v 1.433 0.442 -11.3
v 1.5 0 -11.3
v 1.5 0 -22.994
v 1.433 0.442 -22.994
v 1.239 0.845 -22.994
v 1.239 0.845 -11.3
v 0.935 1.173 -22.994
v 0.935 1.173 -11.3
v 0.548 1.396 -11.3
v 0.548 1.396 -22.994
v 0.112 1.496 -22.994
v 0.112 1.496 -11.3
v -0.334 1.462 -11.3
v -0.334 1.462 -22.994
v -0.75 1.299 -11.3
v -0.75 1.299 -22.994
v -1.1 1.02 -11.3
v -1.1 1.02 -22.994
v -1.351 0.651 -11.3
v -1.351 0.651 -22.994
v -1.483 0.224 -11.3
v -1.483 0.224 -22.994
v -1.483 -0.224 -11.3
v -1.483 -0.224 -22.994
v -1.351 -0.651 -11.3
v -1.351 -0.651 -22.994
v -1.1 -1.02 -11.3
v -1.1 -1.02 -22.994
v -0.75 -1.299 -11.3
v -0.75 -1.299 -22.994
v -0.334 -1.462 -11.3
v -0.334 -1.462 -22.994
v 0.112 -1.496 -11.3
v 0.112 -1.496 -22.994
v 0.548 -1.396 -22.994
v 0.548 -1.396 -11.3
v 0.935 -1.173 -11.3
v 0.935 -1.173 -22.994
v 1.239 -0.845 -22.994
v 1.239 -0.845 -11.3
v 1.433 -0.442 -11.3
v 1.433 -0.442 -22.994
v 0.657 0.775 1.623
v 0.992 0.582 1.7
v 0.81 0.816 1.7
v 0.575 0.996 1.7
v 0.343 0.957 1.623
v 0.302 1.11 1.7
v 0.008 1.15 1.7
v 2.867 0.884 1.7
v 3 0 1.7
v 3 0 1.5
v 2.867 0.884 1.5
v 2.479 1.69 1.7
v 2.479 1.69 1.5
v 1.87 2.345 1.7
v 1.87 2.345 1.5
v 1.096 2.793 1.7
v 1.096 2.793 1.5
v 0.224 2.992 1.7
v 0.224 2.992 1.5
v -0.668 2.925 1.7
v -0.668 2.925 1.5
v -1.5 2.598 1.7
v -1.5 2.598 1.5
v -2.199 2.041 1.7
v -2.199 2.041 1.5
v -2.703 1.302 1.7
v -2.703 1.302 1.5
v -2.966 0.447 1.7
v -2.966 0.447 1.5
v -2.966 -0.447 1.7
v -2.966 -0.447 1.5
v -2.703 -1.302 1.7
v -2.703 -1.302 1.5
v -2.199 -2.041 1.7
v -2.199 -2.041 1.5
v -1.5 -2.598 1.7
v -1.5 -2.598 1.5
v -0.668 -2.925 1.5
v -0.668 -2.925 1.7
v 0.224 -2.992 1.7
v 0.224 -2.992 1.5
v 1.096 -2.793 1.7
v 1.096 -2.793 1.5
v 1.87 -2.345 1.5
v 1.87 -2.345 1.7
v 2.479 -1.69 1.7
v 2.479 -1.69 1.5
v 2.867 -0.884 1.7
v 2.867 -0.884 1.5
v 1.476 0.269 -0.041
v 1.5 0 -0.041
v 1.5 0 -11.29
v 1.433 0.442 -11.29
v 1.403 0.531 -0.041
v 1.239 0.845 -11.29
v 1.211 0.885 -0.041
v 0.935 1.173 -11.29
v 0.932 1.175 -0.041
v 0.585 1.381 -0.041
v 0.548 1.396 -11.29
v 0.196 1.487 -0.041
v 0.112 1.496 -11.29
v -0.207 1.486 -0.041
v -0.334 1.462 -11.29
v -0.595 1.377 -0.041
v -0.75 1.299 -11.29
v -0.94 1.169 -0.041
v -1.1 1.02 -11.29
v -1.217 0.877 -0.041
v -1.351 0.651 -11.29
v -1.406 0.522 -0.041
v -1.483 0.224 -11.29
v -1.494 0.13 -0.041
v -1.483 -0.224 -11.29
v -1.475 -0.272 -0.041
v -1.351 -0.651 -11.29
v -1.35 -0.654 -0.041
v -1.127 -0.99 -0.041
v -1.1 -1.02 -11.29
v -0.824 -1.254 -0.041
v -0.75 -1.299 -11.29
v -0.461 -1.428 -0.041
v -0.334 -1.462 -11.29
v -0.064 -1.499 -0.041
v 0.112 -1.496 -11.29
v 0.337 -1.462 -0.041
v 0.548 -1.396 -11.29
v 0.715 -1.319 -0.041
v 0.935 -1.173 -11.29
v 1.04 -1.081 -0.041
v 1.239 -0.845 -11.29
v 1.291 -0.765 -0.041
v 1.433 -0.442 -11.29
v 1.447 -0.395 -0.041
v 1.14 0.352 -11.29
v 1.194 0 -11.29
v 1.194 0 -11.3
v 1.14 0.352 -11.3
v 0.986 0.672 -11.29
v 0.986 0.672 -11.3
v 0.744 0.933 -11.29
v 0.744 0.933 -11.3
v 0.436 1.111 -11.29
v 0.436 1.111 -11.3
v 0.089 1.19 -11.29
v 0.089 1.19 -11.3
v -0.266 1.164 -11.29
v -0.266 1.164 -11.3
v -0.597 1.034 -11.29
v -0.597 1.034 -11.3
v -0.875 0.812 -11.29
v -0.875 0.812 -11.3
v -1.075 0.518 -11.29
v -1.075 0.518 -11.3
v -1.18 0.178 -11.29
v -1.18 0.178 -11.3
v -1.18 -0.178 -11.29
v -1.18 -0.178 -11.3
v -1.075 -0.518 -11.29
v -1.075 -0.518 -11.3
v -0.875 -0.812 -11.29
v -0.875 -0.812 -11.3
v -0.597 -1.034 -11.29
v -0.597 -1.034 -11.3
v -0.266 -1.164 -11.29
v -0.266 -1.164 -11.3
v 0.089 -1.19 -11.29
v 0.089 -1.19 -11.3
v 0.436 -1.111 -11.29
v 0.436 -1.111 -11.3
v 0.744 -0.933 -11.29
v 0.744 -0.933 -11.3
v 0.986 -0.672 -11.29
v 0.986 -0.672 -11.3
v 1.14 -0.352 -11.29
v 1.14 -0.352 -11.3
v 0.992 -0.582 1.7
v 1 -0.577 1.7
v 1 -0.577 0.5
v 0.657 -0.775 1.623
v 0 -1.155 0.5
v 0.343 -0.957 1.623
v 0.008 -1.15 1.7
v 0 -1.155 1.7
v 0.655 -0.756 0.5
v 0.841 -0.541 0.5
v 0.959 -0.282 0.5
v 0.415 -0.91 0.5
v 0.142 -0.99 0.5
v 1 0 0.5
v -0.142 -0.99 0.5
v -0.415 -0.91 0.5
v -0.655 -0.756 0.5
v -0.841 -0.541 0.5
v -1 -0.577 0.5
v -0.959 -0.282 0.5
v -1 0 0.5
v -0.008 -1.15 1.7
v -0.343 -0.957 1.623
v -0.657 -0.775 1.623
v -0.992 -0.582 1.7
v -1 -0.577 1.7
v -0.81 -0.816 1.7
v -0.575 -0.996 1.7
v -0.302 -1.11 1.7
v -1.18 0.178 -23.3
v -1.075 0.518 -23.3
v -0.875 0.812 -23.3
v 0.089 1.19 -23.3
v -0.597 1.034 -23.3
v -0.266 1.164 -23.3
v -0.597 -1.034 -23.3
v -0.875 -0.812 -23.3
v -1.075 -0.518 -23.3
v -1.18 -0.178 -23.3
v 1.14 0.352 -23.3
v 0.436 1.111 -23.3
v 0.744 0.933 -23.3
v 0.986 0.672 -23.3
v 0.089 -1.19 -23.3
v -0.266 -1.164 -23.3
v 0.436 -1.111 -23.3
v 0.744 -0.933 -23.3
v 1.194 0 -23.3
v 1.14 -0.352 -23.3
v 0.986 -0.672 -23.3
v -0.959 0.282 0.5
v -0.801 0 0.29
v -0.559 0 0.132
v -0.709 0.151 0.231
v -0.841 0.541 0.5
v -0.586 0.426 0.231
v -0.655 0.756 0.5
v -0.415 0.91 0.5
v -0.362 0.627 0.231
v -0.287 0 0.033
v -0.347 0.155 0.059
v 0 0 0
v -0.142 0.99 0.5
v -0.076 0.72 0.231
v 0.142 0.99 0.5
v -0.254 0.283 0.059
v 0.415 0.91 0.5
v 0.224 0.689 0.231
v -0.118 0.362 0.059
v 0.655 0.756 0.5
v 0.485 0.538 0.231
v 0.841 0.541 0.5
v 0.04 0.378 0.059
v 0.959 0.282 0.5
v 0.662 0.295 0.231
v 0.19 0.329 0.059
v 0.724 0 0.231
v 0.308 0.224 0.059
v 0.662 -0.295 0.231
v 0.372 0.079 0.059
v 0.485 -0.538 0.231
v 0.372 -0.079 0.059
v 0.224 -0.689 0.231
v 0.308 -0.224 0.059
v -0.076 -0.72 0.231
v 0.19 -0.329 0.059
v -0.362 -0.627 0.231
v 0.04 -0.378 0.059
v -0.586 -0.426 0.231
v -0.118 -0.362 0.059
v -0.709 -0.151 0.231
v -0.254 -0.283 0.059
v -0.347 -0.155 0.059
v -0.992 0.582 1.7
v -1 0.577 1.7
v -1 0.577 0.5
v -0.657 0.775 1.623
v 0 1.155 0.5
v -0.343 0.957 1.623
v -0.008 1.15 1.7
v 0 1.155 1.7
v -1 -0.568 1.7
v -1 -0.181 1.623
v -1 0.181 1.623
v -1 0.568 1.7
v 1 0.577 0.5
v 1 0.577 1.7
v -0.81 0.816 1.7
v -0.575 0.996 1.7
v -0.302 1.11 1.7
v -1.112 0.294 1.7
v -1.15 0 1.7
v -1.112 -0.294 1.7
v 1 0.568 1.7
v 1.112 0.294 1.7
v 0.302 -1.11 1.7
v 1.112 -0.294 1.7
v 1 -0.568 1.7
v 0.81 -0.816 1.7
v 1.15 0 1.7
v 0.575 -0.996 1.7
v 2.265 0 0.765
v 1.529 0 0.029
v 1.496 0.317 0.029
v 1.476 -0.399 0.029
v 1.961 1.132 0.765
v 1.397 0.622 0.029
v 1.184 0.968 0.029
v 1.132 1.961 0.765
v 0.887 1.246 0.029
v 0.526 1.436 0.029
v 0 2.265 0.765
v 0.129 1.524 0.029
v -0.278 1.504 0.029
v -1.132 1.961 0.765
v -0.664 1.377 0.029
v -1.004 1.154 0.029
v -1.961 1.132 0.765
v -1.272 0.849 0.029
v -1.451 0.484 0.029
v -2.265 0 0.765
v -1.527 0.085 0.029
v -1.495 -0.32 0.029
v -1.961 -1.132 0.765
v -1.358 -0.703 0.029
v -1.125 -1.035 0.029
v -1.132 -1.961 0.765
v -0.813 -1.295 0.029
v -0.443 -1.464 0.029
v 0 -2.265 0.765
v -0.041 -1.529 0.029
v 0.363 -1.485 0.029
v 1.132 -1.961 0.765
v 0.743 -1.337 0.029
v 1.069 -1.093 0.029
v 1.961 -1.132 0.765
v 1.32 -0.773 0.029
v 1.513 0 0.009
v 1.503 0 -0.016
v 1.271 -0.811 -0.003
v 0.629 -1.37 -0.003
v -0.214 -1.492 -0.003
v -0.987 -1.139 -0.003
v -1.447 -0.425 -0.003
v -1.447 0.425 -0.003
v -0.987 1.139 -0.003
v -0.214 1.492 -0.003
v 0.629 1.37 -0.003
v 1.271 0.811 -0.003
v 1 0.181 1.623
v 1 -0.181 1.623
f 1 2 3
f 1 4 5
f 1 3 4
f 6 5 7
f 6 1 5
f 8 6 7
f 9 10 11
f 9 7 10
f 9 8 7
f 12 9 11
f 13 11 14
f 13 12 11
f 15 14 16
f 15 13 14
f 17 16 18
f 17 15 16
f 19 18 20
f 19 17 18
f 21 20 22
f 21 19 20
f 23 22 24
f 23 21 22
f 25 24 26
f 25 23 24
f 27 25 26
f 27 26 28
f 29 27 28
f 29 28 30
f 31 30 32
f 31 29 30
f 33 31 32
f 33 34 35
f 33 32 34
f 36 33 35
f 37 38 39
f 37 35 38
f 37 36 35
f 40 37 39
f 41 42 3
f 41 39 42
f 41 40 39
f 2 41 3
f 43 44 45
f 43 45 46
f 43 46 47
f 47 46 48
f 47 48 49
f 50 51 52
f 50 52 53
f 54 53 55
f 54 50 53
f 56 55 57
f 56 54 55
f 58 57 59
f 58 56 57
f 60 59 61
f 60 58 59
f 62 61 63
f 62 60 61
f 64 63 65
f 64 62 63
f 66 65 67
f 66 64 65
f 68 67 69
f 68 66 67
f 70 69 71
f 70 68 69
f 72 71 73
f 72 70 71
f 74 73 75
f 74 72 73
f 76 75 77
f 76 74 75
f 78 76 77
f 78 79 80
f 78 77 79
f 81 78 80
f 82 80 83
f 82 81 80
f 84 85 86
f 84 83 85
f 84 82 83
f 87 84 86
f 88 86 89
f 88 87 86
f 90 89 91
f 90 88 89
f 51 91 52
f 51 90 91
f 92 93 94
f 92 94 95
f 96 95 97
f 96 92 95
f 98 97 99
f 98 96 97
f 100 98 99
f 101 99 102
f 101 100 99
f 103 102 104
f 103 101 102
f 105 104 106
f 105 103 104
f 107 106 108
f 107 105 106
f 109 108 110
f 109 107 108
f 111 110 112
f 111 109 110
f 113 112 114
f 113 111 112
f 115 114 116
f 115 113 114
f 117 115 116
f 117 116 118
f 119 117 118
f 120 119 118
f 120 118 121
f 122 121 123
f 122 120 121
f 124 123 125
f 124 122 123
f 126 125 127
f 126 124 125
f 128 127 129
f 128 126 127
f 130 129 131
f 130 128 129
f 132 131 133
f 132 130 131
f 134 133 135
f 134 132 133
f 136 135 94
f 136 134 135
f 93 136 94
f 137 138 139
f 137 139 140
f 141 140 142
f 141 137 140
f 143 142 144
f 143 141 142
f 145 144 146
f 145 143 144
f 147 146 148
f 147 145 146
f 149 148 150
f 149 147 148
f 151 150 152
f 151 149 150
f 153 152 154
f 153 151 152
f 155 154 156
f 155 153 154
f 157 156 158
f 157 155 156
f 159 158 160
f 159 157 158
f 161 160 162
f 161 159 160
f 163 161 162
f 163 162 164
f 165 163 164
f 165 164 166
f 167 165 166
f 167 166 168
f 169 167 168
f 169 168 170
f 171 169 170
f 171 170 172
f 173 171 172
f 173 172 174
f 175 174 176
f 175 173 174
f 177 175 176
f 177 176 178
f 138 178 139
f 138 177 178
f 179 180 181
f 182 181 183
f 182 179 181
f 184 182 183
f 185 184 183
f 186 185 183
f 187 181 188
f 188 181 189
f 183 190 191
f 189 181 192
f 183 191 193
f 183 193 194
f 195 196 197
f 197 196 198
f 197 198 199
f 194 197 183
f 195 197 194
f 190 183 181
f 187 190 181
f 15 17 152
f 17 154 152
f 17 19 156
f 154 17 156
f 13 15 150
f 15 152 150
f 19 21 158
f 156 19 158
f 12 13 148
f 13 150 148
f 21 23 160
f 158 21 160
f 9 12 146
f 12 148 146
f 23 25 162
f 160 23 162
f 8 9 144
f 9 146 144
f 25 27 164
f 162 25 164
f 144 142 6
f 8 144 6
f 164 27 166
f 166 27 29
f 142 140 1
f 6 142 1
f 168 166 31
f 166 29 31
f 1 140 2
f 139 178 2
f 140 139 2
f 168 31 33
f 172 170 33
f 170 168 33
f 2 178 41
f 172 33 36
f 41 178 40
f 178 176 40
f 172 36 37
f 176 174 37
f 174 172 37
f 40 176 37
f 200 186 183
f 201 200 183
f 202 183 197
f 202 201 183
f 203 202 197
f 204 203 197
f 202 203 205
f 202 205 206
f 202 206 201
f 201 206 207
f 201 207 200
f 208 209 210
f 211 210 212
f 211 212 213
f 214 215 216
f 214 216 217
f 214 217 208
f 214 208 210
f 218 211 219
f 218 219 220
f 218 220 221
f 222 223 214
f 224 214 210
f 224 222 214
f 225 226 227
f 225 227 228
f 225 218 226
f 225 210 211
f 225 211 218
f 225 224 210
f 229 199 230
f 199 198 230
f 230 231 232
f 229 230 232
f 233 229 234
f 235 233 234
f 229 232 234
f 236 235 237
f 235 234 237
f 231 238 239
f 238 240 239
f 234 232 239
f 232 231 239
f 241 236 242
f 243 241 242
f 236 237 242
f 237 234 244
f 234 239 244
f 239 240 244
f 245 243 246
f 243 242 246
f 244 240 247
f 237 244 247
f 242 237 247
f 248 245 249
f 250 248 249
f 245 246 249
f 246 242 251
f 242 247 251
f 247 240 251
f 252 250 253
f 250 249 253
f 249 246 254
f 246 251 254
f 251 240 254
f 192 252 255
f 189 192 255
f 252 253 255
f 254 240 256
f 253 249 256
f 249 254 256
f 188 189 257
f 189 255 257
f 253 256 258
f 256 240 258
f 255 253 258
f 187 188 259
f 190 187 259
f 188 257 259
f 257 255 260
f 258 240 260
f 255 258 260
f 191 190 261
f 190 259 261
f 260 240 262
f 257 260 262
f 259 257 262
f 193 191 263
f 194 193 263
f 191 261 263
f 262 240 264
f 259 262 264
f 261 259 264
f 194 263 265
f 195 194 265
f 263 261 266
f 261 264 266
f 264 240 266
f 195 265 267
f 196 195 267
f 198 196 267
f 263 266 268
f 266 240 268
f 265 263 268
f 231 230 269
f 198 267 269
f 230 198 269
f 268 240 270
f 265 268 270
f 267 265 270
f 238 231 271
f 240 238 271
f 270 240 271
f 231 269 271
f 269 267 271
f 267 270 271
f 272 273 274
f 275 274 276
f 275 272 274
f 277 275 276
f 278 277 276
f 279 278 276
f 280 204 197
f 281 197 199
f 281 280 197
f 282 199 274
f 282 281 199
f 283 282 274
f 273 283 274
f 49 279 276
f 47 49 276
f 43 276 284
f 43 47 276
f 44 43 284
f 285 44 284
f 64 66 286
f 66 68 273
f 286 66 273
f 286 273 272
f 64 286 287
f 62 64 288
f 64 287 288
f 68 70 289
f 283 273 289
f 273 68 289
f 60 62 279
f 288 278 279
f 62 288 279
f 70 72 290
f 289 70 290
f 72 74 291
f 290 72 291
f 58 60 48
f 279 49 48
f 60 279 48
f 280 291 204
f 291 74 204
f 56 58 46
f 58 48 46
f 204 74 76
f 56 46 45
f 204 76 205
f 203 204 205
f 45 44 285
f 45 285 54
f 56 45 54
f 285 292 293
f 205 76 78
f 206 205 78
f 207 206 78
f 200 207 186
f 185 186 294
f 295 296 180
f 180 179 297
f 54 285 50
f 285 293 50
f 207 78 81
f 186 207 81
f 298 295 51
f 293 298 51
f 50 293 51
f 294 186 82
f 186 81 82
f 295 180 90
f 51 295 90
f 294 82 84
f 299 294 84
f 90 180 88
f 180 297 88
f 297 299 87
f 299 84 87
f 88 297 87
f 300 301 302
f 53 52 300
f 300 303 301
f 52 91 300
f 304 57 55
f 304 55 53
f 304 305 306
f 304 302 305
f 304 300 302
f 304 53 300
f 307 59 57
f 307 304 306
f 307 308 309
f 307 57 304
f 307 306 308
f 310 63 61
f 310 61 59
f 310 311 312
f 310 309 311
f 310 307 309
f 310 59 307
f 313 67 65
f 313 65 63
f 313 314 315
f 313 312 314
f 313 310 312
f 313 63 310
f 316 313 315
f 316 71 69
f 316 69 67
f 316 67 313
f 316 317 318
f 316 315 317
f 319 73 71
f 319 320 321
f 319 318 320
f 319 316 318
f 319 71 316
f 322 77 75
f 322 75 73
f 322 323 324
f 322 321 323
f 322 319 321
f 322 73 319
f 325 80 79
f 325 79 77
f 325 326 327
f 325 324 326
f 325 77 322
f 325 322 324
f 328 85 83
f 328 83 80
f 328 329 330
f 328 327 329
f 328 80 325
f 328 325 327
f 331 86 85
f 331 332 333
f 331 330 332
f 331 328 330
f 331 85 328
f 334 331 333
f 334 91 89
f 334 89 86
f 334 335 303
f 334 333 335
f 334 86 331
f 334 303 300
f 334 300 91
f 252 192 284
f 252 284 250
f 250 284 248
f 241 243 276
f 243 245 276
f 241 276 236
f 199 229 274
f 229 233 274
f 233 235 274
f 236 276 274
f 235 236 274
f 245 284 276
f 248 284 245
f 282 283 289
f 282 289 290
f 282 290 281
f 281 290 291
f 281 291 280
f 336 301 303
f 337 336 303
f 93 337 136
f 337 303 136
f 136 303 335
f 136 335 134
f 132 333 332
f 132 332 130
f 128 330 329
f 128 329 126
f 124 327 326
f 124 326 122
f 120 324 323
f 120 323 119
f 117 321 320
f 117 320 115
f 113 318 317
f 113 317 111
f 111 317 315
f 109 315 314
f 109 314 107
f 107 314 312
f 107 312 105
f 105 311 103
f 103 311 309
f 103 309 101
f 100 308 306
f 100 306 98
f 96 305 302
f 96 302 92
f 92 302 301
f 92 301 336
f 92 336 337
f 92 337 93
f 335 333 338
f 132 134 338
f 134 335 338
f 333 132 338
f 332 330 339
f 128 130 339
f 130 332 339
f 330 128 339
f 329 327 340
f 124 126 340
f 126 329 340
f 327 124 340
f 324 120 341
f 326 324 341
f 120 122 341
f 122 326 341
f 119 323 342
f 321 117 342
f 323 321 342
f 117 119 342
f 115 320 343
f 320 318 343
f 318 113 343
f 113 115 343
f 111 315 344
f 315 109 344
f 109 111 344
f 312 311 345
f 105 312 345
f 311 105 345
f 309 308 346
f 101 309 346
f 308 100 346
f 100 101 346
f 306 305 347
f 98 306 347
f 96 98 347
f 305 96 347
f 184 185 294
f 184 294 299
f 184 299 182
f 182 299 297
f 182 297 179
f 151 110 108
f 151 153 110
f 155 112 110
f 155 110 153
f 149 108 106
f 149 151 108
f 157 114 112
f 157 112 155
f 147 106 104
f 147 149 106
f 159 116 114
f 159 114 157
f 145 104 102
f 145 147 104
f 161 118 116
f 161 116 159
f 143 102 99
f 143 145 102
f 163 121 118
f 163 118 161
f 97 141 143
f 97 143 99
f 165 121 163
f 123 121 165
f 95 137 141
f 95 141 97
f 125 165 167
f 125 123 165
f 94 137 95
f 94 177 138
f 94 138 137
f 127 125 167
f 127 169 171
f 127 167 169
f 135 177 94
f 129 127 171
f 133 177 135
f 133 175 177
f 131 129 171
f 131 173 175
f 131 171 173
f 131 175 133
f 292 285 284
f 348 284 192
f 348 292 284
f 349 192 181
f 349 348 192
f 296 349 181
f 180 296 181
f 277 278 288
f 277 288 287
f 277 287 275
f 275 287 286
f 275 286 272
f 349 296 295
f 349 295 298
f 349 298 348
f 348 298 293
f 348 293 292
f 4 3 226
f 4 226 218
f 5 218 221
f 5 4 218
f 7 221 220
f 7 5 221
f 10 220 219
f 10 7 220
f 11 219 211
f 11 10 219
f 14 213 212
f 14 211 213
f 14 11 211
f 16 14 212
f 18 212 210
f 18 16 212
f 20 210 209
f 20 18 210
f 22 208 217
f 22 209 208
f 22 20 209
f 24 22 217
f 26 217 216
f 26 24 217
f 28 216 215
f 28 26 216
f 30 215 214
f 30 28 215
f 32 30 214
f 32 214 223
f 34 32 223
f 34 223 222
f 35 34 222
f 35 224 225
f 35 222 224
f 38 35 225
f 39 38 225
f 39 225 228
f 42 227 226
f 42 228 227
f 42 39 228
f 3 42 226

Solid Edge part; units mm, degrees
sketch "Sketch1" plane through (0, 0, 0) normal (0, -1, 0) x (1, 0, 0)
  line L0 (1.5, 0) -> (3, 1.5)
  line L1 (3, 1.5) -> (3, 1.7)
  line L2 (3, 1.7) -> (0, 1.7)
  line L3 (0, 1.7) -> (0, -23.3)
  line L4 (0, -23.3) -> (1.1935, -23.3)
  line L5 (1.1935, -23.3) -> (1.5, -22.9935)
  line L6 (1.5, -22.9935) -> (1.5, -11.3)
  line L7 (1.5, -11.3) -> (1.1935, -11.3)
  line L8 (1.1935, -11.3) -> (1.1935, -11.29)
  line L9 (1.1935, -11.29) -> (1.5, -11.29)
  line L10 (1.5, -11.29) -> (1.5, 0)
  dimension "D1" = 25
  dimension "D2" = 3
  dimension "D3" = 1.7
  dimension "D4" = 0.01
  dimension "D5" = 1.1935
  dimension "D6" = 13
  dimension "D7" = 0.2
revolve "RevolvedProtrusion1" add sketch "Sketch1" angle 360 about axis through (0, 0, 54) along (0, 0, -1)
sketch "Sketch2" plane through (0, 0, 0) normal (0, -1, 0) x (1, 0, 0)
  arc A0 (-1, 0.5) -> (0, 0) centre (0, 1.25) ccw
  line L0 (0, 0.5) -> (0, 0)
  line L1 (-1, 0.5) -> (0, 0.5)
  dimension "D1" = 23.8
revolve "RevolvedCutout1" cut sketch "Sketch2" angle 360 about axis through (0, 0, 54) along (0, 0, -1)
sketch "Sketch3" plane through (0, 0, 1.7) normal (0, 0, 1) x (0, -1, 0)
  line L0 (-1.1547, 0) -> (-0.5774, 1)
  line L1 (-0.5774, 1) -> (0.5774, 1)
  line L2 (0.5774, 1) -> (1.1547, 0)
  line L3 (1.1547, 0) -> (0.5774, -1)
  line L4 (0.5774, -1) -> (-0.5774, -1)
  line L5 (-0.5774, -1) -> (-1.1547, 0)
  dimension "D1" = 2
extrude "Cutout1" cut sketch "Sketch3" against normal blind 1.2
cosmetic_thread "Thread1" size "M3"
sketch "Sketch4" plane through (0, 0, 0) normal (1, 0, 0) x (0, 1, 0)
  line L0 (-1.15, 1.7) -> (0, 1.036)
revolve "RevolvedCutout2" cut sketch "Sketch4" angle 360 about axis through (0, 0, -57) along (0, 0, 1) material side at (0, -0.55, 1.4113)
fillet "Round1" radius 0.1 1 edges at (-1.5, 0, 0)
properties material "Stahl"
